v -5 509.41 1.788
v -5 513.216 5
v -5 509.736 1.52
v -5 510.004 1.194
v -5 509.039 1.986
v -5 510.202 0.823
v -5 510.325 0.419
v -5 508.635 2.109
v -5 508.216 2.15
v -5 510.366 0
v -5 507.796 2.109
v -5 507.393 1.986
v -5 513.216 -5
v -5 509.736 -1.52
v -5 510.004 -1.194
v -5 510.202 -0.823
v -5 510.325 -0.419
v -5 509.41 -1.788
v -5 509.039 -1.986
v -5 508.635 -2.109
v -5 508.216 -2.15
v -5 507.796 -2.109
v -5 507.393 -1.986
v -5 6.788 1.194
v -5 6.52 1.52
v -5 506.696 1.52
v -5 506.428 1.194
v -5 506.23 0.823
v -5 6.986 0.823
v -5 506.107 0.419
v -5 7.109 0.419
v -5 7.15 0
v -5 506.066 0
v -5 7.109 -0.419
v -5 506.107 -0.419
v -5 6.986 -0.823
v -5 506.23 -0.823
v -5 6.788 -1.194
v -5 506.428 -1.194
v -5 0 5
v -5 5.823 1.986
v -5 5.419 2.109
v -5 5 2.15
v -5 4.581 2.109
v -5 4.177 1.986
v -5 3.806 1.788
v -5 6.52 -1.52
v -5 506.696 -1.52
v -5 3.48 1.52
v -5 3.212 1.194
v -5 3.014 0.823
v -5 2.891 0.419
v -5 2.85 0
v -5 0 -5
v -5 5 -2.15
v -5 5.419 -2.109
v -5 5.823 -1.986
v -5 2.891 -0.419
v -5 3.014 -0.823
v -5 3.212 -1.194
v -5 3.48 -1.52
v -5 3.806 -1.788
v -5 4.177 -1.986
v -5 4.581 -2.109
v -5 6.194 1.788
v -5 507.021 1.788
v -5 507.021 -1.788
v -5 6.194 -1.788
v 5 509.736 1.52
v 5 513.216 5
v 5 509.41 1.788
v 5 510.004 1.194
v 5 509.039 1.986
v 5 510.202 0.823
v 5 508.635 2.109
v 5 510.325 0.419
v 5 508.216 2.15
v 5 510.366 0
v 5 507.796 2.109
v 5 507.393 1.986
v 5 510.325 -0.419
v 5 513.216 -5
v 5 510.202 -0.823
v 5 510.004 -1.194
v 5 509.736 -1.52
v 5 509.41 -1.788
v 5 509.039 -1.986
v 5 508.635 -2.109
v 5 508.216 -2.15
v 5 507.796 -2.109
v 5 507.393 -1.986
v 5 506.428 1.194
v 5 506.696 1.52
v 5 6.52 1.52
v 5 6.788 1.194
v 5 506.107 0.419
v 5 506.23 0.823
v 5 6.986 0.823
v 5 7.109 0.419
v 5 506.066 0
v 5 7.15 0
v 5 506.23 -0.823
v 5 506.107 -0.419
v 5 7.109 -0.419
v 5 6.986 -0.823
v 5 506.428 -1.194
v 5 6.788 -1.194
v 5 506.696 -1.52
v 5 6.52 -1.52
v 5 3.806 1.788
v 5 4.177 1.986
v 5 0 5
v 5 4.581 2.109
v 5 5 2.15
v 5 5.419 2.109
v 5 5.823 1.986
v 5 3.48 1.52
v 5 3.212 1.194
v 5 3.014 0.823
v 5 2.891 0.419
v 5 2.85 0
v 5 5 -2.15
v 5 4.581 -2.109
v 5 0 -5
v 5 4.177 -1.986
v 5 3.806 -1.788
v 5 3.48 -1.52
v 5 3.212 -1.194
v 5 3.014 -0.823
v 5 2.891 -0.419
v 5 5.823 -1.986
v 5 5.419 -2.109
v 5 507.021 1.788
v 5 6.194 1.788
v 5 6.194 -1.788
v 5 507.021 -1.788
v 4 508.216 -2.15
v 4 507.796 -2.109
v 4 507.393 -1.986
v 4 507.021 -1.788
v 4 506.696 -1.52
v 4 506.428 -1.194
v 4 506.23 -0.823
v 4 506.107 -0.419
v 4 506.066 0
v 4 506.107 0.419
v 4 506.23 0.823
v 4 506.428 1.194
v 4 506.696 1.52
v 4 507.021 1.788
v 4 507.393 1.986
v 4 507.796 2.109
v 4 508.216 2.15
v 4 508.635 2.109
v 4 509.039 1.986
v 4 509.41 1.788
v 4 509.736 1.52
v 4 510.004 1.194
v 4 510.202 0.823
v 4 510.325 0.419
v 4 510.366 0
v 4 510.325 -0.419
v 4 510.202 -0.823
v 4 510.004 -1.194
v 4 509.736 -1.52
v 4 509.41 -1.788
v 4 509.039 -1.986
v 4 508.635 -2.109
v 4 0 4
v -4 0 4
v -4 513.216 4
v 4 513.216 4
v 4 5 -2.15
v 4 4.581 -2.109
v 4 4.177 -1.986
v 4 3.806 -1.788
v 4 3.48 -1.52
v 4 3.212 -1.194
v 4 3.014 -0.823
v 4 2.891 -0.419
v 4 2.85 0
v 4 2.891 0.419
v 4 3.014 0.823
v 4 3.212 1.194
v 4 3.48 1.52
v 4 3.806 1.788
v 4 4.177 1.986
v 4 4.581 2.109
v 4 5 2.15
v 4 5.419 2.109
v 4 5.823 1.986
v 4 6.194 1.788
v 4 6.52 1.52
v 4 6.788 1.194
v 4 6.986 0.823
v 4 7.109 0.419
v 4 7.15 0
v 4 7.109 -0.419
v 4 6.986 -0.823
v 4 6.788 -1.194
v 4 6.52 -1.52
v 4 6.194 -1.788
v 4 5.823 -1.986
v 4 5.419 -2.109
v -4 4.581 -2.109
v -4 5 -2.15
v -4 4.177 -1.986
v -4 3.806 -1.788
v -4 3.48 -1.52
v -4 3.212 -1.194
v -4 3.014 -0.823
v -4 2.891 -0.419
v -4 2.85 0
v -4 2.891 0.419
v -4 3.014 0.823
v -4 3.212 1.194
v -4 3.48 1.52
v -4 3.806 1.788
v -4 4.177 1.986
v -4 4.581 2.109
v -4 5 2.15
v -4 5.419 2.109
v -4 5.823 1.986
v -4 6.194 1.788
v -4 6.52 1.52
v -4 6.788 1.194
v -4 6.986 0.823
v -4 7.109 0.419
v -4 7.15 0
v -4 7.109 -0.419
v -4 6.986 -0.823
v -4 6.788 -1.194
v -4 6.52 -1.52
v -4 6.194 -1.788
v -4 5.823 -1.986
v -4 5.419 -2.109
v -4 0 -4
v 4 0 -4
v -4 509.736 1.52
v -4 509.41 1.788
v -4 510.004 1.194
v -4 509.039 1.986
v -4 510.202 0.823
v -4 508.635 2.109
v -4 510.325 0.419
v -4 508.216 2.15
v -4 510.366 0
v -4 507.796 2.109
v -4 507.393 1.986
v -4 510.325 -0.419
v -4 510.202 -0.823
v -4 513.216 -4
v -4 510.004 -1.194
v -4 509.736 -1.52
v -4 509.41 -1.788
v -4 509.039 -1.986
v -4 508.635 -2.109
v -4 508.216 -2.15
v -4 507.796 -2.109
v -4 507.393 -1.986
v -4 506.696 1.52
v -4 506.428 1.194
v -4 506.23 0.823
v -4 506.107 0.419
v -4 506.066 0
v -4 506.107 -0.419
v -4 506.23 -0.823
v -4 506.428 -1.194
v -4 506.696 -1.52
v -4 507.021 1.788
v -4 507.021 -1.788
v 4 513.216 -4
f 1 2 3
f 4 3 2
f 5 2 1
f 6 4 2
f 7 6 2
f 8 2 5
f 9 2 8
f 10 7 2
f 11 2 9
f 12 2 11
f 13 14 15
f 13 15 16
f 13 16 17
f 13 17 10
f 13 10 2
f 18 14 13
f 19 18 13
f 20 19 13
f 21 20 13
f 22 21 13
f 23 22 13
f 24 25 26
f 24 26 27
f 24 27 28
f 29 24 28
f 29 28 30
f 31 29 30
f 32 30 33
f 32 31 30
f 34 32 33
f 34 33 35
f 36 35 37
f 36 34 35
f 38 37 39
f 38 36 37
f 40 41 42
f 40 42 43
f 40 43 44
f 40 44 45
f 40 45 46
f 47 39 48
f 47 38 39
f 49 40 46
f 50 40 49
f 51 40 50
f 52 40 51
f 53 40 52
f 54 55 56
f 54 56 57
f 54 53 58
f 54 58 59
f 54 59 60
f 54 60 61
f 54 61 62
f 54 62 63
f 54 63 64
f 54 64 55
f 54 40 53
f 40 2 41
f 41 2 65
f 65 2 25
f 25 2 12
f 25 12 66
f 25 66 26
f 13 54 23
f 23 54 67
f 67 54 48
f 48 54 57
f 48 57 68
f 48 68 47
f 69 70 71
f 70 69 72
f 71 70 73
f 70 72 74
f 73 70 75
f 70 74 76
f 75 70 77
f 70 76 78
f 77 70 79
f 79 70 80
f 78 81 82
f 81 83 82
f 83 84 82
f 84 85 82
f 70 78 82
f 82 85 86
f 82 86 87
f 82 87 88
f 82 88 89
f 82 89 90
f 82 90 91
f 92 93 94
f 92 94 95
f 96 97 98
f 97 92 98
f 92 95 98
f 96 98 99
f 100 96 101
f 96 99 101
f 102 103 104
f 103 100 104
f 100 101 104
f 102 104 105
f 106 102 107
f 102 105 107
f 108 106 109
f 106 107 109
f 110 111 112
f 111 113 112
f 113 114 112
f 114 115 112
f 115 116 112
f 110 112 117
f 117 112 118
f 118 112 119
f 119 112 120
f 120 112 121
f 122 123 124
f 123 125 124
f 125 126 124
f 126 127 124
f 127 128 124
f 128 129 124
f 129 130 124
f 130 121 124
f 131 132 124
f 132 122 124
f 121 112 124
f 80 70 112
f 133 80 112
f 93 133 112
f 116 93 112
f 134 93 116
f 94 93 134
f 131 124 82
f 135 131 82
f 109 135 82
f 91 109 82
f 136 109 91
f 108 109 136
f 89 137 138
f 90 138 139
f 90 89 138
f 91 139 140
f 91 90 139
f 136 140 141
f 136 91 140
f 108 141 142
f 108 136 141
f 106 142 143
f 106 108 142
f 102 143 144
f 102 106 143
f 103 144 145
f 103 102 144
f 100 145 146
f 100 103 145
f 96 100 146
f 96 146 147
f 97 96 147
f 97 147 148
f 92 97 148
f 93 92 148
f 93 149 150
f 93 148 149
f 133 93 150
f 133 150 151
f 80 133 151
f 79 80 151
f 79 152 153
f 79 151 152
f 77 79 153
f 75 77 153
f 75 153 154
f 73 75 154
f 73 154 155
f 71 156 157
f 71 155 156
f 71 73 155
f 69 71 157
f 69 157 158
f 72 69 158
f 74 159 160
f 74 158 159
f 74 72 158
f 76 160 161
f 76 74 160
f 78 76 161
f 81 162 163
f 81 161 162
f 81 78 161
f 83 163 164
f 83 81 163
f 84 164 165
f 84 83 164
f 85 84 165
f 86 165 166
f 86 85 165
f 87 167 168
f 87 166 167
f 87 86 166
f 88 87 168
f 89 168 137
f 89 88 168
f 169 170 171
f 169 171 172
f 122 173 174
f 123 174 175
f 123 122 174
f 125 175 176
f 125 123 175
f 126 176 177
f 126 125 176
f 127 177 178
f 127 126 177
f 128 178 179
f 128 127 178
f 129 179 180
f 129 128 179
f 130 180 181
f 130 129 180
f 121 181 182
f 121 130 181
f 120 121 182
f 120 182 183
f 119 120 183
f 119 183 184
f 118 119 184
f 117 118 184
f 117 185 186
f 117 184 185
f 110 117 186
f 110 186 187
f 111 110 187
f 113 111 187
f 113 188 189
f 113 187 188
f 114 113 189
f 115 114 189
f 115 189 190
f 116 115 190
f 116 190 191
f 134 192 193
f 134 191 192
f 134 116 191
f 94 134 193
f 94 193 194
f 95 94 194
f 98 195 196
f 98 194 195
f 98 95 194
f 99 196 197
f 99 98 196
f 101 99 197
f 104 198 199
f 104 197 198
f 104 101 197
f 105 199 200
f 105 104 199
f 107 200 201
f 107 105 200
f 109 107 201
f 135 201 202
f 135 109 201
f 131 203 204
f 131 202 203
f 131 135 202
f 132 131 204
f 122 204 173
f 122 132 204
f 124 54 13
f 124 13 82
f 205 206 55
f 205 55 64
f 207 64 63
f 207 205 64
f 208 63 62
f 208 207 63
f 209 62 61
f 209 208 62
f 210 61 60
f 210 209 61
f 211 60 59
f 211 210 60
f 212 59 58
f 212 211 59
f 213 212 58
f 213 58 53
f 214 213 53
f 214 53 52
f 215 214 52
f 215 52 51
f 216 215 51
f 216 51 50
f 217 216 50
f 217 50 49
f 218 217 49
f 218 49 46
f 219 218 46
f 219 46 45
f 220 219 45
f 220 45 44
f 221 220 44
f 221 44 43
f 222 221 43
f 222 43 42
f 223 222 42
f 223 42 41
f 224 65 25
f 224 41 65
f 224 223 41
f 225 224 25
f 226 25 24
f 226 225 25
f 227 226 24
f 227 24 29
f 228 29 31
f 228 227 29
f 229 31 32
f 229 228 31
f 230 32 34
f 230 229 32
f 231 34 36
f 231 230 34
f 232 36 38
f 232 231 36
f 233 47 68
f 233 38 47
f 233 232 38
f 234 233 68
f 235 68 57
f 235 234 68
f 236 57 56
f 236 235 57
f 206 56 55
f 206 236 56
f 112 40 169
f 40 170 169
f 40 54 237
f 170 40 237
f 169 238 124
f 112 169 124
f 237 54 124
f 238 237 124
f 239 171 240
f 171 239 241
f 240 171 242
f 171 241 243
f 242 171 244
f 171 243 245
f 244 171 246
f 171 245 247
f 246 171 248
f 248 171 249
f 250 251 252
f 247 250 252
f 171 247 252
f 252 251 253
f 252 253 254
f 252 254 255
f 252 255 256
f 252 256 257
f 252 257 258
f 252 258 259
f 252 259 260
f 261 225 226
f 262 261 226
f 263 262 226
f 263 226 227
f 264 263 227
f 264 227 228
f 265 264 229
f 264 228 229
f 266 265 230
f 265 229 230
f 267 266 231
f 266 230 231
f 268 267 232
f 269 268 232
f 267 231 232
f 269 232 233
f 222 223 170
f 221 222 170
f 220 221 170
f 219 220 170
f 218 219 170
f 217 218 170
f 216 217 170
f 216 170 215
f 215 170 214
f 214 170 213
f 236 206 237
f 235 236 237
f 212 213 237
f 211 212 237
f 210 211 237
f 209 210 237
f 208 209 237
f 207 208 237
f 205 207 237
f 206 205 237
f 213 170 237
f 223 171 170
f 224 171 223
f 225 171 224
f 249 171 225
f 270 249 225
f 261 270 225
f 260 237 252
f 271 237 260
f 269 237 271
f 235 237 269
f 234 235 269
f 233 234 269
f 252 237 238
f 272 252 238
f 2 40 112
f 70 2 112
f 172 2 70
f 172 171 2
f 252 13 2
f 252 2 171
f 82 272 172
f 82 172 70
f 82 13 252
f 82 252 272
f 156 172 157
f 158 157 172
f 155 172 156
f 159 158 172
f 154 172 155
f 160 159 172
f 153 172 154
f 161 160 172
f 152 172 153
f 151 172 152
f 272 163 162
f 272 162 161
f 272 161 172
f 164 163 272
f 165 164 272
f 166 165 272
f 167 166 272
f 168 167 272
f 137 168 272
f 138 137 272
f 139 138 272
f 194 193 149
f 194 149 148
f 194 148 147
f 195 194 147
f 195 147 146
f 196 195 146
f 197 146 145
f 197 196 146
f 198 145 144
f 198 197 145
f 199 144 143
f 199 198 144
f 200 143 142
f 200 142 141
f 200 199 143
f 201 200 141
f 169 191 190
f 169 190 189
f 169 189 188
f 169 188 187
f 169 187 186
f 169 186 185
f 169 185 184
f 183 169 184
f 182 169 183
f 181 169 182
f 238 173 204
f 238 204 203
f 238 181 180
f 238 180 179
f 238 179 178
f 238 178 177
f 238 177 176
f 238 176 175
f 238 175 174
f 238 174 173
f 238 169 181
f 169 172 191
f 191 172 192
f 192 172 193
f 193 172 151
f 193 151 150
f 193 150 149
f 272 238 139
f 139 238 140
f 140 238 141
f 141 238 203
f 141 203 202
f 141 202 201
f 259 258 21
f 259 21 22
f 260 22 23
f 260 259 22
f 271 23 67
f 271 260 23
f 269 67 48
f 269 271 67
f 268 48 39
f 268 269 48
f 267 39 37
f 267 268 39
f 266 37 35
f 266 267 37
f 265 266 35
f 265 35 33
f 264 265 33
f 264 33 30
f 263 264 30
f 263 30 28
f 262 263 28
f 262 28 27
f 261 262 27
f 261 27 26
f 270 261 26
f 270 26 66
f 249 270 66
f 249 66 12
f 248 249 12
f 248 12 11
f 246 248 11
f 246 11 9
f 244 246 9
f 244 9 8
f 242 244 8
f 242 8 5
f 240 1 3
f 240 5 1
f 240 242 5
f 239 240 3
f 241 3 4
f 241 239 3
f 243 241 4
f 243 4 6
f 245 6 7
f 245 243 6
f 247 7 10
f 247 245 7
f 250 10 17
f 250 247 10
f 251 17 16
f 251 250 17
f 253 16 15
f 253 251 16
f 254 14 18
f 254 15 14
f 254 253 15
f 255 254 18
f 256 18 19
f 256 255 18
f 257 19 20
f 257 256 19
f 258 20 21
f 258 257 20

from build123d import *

# Parameters (mm, degrees)
SKETCH_1_W          = 10
SKETCH_1_H          = 10
SKETCH_1_W_2        = 8
SKETCH_1_H_2        = 8
EXTRUDE_1_DEPTH     = 513.21590794
SKETCH_4_R          = 2.15
CUT_EXTRUDE_2_DEPTH = 514.337674599


with BuildPart() as part:
    # ｽｹｯﾁ1 → 押し出し-薄板1 (new body)
    with BuildSketch(Plane(origin=(0, 0, 0), x_dir=(1, 0, 0), z_dir=(0, 1, 0))):
        Rectangle(SKETCH_1_W, SKETCH_1_H)
        Rectangle(SKETCH_1_W_2, SKETCH_1_H_2, mode=Mode.SUBTRACT)
    extrude(amount=EXTRUDE_1_DEPTH)

    # ｽｹｯﾁ4 → ｶｯﾄ - 押し出し2 (cut, through all)
    with BuildSketch(Plane.ZY.offset(-5)):
        with Locations(Location((0, 508.21590794, 0), (0, 0, 180))):
            Circle(SKETCH_4_R)
        with Locations(Location((0, 5, 0), (0, 0, 180))):
            Circle(SKETCH_4_R)
    extrude(amount=CUT_EXTRUDE_2_DEPTH, mode=Mode.SUBTRACT)


solid = part.part
